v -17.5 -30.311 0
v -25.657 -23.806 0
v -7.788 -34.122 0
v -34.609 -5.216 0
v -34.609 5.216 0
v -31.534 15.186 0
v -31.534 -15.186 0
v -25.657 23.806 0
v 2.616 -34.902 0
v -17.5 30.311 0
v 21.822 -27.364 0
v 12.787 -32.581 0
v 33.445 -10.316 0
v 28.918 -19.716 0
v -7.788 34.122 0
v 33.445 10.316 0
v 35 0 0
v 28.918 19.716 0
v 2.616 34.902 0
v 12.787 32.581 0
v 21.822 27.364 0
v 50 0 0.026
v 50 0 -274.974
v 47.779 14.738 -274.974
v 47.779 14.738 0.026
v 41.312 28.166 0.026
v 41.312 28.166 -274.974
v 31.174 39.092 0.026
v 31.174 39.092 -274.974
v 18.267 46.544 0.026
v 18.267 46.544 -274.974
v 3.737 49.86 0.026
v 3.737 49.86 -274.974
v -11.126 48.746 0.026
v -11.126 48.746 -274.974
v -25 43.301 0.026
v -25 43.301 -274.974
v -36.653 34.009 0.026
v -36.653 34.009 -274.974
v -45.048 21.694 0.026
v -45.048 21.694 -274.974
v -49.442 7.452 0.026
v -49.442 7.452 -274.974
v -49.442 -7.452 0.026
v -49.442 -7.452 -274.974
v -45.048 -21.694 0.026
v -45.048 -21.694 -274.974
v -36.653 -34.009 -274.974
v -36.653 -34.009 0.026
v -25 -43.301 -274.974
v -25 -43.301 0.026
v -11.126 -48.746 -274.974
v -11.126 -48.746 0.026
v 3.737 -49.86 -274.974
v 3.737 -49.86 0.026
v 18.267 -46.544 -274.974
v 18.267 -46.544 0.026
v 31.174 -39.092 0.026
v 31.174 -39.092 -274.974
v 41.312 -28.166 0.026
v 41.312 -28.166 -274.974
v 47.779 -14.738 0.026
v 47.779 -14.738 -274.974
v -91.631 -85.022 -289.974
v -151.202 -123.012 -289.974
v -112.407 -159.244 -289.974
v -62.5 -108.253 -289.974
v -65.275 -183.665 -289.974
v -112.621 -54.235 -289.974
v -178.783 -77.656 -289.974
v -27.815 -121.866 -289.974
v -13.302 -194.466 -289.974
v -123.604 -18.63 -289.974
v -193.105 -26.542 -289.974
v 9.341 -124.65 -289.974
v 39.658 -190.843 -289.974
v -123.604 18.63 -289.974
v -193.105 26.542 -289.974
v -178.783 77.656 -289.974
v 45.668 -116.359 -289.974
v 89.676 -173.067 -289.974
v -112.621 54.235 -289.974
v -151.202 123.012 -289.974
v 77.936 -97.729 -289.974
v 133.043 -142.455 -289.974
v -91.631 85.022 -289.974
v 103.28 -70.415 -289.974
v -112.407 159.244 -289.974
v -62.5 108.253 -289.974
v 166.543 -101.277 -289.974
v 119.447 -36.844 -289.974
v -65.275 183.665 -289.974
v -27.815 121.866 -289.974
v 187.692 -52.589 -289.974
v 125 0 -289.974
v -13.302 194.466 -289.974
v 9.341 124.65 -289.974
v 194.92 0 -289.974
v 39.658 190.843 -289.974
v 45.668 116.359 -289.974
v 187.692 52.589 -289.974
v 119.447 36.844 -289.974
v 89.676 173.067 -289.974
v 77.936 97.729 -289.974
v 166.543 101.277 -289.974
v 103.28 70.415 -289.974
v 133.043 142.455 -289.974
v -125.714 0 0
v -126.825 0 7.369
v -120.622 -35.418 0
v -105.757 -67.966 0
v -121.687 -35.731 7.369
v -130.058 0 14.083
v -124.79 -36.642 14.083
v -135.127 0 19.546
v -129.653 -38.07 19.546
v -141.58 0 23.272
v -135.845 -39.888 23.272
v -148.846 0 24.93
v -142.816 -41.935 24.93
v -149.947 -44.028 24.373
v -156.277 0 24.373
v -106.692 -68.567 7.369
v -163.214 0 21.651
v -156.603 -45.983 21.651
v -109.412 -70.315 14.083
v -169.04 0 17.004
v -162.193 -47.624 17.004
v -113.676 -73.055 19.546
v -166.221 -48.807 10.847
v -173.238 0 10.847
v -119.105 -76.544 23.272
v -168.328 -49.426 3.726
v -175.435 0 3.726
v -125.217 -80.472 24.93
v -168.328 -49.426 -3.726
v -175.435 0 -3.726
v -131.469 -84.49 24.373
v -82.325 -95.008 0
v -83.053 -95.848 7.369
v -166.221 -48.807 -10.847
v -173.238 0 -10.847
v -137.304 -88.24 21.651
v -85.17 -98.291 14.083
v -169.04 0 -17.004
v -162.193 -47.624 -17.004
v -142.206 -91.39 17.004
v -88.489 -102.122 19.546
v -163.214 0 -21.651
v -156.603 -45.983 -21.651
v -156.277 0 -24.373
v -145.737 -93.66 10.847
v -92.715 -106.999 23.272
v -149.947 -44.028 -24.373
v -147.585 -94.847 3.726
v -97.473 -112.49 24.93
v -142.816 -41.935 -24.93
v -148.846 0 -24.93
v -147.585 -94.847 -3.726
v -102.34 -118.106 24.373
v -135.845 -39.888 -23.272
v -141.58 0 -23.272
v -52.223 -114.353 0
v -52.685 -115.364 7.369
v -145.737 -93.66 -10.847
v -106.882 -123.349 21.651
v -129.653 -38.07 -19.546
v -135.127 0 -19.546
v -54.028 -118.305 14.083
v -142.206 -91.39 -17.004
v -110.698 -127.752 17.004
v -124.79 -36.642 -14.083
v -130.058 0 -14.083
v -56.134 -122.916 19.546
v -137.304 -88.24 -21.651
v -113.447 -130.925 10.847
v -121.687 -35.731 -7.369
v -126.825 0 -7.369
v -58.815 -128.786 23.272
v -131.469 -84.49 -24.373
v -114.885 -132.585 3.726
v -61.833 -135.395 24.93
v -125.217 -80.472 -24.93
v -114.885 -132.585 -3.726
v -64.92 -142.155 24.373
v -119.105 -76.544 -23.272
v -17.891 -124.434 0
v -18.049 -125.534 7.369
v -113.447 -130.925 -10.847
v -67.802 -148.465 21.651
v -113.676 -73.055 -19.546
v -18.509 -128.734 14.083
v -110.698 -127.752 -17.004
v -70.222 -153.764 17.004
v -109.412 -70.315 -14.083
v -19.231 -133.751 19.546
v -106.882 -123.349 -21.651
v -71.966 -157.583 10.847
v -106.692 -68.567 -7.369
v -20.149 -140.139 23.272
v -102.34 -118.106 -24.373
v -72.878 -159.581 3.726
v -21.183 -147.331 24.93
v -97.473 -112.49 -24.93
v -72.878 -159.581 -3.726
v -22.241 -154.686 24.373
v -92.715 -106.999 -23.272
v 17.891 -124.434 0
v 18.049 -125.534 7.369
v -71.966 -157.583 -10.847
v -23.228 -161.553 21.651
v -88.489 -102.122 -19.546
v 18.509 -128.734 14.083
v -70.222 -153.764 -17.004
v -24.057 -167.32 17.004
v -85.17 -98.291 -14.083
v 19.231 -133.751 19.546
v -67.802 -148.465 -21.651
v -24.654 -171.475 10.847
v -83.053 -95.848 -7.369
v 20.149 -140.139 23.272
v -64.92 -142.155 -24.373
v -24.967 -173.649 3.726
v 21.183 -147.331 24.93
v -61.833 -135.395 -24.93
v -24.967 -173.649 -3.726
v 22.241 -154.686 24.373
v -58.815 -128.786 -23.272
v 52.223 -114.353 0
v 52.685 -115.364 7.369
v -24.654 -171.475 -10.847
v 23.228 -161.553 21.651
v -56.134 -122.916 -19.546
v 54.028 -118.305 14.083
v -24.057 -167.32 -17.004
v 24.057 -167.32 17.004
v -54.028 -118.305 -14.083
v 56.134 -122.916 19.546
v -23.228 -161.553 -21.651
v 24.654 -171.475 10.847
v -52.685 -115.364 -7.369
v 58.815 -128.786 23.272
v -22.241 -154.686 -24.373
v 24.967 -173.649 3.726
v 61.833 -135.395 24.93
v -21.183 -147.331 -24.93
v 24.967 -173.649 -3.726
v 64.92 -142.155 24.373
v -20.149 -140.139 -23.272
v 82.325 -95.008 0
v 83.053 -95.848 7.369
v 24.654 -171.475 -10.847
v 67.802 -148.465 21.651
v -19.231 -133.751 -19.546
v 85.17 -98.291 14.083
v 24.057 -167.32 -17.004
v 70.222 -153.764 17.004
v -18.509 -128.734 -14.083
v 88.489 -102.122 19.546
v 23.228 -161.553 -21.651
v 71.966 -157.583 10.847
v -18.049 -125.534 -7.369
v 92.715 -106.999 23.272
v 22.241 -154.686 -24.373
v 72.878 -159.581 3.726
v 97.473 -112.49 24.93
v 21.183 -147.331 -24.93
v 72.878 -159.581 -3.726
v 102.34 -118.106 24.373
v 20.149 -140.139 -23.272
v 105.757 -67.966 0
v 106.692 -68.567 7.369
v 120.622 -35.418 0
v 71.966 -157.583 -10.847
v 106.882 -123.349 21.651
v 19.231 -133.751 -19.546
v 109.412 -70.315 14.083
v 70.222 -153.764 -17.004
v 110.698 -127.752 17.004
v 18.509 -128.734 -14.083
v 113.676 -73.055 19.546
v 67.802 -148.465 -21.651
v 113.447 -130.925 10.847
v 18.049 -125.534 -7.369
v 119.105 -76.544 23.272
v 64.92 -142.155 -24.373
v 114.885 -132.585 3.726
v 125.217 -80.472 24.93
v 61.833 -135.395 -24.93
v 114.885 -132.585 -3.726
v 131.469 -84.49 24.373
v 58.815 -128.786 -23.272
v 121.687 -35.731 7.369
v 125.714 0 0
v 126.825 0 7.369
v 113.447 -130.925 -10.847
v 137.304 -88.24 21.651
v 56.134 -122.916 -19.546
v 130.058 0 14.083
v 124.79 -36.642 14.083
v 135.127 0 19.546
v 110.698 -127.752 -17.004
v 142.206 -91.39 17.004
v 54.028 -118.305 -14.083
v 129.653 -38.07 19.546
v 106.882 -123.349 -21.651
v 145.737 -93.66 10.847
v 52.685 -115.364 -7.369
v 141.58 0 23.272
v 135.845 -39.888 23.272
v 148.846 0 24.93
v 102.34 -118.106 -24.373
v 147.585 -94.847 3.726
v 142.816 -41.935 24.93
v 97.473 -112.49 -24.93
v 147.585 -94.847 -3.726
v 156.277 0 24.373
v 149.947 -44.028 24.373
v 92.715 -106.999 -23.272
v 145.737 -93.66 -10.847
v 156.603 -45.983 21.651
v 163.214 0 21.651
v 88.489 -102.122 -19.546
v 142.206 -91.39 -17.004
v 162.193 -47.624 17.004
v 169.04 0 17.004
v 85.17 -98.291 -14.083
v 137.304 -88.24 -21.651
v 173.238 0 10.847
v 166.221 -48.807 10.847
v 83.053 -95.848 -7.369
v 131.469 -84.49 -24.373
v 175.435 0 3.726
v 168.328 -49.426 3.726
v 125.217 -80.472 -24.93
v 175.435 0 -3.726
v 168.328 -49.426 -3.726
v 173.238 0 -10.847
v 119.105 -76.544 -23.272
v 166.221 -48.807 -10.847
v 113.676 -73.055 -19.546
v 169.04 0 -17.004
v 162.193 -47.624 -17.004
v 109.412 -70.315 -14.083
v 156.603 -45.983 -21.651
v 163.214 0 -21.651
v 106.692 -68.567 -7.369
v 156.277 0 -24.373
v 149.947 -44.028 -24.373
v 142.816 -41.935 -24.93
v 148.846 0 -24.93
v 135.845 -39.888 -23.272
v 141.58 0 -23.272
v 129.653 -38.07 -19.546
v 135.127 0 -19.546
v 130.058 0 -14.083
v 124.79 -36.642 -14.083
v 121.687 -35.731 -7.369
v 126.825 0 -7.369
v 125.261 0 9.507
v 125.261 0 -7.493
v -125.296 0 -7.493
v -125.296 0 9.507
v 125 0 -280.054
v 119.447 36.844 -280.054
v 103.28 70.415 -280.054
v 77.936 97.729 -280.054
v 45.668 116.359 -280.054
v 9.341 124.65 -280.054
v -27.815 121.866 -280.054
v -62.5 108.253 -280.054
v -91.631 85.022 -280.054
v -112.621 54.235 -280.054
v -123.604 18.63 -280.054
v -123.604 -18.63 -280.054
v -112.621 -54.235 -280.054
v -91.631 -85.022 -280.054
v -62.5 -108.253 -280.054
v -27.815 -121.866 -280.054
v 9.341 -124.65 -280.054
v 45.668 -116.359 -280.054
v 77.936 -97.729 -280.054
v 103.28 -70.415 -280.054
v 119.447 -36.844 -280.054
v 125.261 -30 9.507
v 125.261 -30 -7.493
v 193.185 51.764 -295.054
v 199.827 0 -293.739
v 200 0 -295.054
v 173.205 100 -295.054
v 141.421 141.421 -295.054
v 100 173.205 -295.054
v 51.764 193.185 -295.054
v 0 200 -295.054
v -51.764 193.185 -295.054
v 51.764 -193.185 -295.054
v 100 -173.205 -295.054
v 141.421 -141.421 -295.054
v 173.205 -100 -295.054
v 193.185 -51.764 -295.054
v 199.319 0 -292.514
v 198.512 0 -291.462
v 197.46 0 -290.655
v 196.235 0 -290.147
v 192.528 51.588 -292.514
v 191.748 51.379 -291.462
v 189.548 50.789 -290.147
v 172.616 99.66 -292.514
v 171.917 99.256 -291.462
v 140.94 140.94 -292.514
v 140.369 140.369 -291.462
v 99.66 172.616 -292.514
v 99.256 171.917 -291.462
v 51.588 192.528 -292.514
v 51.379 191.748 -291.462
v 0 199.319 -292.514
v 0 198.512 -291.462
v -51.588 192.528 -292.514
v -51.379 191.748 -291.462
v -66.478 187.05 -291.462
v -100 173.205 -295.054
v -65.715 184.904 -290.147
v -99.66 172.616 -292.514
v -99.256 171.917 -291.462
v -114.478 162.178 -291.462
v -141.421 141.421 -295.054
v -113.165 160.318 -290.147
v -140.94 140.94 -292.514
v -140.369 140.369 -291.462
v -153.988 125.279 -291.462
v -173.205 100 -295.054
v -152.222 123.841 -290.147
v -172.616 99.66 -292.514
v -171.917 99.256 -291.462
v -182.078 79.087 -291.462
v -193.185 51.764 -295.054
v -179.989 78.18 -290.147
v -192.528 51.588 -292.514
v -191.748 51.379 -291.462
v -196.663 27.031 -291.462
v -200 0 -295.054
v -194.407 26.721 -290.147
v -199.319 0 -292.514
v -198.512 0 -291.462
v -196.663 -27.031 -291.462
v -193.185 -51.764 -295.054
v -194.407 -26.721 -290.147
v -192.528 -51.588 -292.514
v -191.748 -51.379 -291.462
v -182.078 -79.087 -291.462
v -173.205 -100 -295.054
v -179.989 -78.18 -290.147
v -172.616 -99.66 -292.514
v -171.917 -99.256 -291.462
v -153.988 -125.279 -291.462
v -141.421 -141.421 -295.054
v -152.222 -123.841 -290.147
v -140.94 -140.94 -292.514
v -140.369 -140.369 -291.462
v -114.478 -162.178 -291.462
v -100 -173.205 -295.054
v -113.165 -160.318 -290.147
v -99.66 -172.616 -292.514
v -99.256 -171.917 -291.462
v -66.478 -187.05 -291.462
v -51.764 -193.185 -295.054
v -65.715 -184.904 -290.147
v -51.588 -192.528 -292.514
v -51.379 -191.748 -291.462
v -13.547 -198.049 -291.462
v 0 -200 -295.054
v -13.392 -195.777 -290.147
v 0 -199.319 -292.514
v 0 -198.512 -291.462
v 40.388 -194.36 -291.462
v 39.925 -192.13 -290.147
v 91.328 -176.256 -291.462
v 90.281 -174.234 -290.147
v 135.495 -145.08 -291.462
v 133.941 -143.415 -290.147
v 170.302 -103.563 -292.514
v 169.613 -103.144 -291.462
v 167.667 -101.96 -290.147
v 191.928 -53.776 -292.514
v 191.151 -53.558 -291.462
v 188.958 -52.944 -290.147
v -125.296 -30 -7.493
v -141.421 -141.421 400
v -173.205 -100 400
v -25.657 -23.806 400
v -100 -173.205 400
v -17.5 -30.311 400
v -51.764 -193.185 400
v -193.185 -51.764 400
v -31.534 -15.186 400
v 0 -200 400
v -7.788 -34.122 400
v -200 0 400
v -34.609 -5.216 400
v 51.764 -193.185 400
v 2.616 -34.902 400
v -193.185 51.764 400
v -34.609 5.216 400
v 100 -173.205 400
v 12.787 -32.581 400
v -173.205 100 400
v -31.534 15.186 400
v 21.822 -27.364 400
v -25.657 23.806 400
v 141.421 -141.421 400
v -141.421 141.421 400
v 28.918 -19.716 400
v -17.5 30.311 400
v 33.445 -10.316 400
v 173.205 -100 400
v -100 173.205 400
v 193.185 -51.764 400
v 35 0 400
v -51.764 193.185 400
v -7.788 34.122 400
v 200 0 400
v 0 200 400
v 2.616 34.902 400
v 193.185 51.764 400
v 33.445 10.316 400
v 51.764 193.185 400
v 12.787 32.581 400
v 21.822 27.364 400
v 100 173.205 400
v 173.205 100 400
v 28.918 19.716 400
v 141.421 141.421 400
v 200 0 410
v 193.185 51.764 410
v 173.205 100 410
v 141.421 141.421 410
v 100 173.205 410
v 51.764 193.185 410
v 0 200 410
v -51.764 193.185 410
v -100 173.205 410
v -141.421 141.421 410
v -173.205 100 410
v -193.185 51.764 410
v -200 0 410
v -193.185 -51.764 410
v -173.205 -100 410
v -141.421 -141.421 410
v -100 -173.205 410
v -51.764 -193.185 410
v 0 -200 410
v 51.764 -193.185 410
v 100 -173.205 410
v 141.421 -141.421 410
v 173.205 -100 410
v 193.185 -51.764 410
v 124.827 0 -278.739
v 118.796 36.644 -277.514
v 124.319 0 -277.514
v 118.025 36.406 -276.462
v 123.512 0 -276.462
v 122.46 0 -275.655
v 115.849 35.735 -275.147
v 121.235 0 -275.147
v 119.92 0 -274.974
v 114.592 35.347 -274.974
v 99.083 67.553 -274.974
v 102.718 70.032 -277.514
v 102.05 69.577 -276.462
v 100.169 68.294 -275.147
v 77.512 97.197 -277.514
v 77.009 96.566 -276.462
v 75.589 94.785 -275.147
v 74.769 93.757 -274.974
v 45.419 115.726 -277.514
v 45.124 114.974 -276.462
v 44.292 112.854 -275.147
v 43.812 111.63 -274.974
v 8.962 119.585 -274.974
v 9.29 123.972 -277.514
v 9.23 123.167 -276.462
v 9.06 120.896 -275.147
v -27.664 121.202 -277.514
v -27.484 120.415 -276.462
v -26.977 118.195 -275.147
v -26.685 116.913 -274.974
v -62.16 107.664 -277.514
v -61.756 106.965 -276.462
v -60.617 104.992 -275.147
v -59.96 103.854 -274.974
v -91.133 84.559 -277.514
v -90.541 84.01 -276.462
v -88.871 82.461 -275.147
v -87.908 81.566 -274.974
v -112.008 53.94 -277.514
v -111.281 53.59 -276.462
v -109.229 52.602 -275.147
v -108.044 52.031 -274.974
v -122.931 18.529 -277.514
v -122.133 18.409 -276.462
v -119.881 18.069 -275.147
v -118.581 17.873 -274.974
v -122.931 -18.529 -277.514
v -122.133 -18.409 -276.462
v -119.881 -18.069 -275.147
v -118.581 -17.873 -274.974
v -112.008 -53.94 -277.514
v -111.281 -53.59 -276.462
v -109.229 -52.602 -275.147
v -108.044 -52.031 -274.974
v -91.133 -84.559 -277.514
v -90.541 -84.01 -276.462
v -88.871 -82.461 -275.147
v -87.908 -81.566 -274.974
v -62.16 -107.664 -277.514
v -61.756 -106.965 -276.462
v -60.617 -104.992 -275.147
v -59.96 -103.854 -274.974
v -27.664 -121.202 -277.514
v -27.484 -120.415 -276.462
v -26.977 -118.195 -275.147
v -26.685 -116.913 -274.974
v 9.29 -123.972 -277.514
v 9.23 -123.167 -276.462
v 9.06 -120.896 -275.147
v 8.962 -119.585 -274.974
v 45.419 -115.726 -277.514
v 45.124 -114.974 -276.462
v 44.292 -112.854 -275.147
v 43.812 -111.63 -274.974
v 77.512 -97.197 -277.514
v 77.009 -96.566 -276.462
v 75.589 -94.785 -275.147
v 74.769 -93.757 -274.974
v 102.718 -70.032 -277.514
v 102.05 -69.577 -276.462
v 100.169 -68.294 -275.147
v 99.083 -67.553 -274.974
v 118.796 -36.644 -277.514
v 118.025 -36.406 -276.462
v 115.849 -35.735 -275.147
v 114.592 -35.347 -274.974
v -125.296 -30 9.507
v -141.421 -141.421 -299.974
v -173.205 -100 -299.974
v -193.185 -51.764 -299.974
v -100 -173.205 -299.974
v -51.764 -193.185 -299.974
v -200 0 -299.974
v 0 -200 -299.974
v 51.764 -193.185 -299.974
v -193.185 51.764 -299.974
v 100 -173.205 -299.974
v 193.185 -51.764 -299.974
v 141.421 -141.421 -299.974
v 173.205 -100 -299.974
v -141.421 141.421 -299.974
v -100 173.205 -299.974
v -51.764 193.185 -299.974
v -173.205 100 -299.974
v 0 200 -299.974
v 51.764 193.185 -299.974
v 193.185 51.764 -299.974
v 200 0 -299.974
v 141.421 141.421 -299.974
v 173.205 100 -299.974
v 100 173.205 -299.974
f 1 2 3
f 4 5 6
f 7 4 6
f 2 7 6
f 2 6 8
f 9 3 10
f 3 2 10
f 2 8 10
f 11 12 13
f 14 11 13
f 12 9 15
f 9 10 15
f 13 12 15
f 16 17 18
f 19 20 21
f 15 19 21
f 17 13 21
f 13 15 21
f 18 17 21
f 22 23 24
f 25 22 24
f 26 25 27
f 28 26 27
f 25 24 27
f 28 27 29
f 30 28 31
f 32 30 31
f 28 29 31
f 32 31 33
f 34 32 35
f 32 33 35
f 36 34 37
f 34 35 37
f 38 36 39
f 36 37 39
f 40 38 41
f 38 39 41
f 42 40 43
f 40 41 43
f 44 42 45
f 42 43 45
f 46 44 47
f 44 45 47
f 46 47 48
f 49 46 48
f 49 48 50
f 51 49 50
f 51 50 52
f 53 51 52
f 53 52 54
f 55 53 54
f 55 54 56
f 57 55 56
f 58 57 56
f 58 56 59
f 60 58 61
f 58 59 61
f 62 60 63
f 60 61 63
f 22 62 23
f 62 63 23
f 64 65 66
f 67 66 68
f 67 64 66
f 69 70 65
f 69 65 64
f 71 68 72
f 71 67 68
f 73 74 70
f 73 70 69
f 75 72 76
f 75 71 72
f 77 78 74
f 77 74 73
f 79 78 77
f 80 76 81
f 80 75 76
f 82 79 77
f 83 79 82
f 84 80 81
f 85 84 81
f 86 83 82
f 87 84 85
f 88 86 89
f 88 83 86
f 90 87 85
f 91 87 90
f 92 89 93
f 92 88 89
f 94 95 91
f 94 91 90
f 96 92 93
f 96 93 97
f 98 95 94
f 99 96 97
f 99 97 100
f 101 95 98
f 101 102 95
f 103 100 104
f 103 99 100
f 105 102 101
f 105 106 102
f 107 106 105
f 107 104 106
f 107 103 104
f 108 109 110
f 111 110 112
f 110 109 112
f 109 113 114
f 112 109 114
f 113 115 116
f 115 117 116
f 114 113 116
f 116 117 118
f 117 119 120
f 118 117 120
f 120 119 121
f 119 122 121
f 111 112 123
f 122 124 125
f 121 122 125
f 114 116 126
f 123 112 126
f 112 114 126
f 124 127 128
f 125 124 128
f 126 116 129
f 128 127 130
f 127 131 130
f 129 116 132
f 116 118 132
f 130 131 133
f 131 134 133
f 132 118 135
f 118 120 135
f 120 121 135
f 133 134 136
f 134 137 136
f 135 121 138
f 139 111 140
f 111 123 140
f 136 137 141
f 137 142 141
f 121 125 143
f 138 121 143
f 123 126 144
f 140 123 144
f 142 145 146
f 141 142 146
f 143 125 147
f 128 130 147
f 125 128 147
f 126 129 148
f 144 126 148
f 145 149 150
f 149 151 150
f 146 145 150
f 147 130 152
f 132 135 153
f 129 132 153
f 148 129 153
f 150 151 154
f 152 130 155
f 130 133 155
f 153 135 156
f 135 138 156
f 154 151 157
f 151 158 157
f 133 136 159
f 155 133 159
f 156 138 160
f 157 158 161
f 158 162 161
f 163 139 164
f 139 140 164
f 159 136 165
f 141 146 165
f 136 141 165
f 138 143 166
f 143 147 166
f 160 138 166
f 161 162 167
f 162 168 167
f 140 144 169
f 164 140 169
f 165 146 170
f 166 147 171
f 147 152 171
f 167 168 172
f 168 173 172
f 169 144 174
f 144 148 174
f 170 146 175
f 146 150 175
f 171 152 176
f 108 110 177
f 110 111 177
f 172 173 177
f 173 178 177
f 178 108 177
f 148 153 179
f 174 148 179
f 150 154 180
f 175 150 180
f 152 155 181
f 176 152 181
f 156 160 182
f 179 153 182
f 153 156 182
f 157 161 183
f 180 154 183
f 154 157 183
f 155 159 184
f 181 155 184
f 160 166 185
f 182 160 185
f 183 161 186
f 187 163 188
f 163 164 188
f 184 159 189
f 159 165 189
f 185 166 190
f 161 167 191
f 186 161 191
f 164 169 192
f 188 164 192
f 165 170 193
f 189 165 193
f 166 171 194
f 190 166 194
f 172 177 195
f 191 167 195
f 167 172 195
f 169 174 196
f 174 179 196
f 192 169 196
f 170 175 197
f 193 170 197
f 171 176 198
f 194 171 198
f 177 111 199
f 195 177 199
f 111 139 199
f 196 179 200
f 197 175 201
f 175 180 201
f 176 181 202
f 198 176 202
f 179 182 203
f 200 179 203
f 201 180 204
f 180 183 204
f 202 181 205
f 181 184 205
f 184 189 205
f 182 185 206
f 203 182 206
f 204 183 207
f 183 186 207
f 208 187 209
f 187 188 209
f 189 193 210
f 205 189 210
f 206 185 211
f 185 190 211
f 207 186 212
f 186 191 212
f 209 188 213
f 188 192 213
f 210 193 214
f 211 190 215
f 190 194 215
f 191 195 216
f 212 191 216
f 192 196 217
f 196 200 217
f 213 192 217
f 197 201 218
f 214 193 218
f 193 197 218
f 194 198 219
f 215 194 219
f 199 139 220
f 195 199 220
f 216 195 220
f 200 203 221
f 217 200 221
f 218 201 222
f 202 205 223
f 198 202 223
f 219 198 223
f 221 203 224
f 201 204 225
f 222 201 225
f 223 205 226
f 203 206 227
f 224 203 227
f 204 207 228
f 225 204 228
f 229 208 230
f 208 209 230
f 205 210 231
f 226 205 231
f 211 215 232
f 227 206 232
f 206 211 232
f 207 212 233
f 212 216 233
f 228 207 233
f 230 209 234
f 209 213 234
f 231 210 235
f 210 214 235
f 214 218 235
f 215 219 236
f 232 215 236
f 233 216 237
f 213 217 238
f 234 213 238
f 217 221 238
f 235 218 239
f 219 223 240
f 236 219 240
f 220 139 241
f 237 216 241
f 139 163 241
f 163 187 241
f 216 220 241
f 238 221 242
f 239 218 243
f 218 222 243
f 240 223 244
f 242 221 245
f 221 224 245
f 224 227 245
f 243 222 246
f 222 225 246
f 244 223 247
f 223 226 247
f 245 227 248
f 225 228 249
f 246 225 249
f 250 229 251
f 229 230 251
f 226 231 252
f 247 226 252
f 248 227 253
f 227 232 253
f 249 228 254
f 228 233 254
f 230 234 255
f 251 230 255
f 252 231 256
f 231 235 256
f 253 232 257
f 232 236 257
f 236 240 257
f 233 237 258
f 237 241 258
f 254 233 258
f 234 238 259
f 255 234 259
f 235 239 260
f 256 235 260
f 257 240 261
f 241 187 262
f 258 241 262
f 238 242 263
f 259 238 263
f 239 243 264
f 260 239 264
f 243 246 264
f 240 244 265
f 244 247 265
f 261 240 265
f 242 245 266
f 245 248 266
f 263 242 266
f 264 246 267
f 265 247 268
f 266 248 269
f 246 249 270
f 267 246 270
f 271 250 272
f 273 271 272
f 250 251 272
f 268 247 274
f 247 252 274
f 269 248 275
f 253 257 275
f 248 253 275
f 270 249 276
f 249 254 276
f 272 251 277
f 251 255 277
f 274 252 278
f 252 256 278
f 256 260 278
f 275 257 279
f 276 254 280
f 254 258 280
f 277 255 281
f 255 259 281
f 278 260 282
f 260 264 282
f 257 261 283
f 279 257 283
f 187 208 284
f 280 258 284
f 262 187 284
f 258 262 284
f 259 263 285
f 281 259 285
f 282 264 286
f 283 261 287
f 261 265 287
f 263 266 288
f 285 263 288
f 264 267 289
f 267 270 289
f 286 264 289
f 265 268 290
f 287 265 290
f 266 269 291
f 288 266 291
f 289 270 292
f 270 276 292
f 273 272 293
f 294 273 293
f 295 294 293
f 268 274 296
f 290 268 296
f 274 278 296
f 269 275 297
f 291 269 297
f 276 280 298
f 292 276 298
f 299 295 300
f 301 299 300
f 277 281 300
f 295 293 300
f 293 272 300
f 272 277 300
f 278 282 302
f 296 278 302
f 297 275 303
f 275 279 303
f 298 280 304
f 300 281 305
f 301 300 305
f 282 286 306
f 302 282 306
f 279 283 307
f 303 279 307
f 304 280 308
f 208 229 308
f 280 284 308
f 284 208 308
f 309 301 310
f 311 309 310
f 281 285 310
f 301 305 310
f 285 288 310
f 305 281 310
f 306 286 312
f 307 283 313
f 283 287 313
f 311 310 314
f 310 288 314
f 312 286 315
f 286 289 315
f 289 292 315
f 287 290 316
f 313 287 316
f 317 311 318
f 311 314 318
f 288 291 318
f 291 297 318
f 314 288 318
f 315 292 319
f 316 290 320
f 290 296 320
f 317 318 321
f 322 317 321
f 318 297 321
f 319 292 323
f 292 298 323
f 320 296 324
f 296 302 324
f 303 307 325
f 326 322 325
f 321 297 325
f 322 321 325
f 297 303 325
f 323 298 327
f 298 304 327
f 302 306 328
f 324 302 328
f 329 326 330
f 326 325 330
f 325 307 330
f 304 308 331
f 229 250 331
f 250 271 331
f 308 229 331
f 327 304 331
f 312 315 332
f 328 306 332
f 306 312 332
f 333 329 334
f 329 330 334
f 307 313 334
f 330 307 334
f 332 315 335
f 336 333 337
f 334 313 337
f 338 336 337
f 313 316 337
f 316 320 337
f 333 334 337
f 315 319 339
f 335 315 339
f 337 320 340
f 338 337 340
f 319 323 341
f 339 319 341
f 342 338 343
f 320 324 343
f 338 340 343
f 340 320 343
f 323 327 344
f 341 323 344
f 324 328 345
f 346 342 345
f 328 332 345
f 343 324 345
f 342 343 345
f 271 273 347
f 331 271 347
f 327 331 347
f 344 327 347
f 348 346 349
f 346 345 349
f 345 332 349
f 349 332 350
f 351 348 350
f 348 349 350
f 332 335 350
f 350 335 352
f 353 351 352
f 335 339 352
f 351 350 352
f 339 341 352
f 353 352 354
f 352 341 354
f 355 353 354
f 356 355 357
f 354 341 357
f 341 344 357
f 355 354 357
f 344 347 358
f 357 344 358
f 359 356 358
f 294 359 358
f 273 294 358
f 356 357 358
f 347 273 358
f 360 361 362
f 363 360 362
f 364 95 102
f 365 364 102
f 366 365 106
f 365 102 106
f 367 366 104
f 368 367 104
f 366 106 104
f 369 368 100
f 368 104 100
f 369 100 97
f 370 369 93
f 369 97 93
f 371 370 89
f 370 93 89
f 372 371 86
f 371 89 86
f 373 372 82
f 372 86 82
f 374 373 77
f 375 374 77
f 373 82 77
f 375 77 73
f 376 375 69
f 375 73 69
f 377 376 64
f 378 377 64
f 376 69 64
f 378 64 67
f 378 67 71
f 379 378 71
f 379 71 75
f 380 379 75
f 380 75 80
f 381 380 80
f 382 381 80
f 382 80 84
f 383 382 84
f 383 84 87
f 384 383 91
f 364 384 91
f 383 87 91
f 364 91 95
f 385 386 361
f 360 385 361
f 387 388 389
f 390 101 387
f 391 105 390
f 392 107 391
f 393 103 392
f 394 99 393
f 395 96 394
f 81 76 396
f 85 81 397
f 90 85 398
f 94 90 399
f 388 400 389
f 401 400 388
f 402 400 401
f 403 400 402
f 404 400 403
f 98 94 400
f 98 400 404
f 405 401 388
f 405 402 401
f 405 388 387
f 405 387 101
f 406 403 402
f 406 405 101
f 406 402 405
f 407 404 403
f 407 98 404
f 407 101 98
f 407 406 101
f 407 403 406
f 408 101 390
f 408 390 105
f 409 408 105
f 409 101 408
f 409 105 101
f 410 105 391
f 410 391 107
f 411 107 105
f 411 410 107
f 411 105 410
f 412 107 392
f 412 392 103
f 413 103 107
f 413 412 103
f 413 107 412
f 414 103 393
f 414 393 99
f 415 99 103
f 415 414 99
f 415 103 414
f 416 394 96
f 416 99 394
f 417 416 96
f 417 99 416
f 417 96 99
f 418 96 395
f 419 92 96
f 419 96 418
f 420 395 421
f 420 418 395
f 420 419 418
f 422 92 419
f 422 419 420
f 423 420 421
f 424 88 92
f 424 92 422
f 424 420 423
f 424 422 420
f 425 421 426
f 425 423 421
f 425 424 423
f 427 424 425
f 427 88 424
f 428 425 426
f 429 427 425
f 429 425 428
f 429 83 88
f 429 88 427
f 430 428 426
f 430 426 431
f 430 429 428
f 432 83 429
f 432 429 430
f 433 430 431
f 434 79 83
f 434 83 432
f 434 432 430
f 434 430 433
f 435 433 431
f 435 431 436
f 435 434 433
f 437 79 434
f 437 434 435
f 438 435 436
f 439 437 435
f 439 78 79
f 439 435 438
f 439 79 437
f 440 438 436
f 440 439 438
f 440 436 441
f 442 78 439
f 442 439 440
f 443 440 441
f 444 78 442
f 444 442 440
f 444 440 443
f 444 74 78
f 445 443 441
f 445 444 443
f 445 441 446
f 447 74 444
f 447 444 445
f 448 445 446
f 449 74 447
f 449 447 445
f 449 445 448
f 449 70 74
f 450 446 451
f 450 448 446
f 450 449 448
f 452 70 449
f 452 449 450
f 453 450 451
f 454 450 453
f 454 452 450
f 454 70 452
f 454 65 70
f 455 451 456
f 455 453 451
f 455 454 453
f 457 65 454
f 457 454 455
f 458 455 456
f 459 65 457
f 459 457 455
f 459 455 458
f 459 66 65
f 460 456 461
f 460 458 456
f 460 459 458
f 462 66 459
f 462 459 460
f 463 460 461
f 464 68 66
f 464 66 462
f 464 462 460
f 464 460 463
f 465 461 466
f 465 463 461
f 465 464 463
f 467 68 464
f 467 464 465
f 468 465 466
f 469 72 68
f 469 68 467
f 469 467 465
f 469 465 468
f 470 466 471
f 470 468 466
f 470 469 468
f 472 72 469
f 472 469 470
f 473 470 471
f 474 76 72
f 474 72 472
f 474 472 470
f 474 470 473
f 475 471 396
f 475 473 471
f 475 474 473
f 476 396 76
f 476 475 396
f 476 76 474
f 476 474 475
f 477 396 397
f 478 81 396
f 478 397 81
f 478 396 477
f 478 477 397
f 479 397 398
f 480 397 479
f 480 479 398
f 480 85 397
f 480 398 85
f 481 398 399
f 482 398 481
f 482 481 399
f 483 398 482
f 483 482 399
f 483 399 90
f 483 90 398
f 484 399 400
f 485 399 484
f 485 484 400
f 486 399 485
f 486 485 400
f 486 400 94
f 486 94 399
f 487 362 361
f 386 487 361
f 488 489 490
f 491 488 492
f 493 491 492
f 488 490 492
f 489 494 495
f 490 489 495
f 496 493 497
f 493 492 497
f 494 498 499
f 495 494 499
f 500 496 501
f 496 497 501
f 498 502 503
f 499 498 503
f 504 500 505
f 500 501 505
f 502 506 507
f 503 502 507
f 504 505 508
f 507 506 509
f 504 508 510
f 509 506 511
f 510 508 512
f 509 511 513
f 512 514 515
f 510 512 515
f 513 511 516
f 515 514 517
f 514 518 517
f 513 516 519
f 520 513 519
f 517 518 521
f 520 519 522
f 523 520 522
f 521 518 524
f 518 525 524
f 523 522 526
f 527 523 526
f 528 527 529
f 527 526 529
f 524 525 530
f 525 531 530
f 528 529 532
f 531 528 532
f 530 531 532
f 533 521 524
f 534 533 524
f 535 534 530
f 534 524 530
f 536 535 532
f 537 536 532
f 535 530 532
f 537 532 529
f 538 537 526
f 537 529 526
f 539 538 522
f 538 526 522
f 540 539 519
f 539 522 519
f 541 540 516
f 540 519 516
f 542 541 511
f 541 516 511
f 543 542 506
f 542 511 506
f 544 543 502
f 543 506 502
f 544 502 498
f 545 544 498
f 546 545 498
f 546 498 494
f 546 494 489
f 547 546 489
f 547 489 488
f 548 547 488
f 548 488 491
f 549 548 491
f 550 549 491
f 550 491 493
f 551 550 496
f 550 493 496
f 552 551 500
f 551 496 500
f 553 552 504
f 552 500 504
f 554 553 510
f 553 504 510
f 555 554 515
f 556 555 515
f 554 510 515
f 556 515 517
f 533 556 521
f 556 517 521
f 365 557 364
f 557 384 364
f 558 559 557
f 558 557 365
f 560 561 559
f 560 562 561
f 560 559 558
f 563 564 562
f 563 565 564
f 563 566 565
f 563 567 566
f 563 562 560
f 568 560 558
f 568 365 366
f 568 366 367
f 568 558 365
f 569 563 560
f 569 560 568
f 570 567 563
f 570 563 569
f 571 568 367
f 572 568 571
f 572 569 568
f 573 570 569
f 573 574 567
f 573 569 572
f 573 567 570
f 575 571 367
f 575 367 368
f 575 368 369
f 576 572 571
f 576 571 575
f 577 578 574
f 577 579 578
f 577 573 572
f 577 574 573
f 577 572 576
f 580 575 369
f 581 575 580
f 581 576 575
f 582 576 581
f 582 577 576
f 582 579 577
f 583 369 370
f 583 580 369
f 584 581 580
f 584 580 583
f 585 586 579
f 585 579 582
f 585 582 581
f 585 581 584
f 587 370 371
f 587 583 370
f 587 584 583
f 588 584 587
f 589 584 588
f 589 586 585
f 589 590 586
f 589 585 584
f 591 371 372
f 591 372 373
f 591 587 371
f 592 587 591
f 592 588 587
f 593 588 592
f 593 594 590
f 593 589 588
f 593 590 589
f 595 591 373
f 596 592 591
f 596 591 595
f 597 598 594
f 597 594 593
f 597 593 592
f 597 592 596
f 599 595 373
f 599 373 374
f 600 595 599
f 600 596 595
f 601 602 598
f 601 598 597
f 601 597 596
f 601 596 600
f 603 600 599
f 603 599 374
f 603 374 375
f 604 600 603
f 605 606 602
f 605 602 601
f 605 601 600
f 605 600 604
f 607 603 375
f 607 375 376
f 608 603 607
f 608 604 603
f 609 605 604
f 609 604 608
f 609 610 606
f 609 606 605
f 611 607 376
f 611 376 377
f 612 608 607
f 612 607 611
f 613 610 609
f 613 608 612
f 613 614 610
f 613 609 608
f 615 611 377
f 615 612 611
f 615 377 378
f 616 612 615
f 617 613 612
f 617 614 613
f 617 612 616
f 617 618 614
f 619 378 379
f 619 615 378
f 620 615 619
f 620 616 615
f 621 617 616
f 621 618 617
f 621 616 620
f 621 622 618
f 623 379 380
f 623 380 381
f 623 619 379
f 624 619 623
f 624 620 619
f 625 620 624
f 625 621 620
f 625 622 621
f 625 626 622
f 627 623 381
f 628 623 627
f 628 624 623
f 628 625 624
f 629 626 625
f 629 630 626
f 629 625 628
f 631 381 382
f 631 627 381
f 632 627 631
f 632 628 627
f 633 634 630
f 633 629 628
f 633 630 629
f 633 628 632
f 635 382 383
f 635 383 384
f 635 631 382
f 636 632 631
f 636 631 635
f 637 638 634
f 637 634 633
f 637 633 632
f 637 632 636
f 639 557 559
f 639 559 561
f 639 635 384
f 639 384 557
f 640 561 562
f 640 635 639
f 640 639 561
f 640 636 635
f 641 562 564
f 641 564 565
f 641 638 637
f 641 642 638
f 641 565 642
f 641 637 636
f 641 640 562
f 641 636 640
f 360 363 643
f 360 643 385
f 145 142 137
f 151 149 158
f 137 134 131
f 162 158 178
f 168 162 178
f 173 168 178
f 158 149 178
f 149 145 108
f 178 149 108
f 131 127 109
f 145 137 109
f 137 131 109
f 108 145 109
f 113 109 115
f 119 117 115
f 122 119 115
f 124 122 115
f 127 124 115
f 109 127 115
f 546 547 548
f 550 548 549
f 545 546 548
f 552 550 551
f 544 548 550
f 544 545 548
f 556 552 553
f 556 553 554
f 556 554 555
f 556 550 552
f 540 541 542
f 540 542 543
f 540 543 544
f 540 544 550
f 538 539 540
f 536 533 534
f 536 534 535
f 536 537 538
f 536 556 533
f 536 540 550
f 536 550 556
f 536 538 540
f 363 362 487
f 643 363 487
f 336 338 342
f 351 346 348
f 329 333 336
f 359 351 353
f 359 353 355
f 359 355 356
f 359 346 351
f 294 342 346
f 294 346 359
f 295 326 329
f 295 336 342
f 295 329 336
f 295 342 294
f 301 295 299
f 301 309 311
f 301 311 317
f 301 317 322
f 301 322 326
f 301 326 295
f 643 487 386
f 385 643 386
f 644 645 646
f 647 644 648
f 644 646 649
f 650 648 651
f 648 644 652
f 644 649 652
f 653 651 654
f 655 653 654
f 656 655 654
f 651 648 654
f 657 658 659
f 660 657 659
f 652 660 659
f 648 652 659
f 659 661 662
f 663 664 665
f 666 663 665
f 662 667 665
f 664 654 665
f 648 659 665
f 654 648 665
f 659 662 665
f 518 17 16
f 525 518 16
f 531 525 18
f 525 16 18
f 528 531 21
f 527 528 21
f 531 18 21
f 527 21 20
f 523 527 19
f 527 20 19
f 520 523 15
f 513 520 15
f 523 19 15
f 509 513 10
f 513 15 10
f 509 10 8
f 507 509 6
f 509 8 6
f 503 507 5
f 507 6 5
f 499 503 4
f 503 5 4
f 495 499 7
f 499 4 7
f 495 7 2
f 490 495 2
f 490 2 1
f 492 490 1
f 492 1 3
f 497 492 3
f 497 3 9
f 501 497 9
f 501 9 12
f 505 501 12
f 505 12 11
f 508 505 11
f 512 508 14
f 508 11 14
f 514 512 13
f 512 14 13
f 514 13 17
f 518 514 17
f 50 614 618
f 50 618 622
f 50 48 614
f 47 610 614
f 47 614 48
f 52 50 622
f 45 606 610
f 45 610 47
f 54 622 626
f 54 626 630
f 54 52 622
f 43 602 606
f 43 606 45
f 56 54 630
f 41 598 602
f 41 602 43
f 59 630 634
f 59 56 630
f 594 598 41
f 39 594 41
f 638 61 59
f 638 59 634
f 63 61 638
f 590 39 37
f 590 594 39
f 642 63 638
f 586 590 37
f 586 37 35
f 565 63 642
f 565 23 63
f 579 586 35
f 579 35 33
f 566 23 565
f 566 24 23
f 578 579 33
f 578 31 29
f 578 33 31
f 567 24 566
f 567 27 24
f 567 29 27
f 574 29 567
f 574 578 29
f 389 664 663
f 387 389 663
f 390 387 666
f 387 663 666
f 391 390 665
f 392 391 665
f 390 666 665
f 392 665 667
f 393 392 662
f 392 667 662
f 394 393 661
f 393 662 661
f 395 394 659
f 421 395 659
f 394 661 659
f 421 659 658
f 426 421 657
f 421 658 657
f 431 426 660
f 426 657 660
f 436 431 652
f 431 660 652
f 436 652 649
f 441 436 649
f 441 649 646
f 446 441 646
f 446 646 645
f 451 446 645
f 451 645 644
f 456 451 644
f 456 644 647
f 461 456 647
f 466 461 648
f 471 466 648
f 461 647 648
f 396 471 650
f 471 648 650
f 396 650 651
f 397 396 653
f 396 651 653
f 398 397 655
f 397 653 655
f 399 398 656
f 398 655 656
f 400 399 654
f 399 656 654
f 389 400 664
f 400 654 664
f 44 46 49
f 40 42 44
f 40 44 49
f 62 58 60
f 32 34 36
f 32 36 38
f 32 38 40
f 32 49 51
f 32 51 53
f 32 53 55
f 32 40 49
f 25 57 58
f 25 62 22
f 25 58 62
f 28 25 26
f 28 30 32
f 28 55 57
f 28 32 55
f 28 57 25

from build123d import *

# Parameters (mm, degrees)
F1_R      = 200
F2_DEPTH  = 10
F3_R      = 125
F4_DEPTH  = 15
F5_R      = 5.08
F6_R      = 50
F7_DEPTH  = 275
F9_R      = 25
F10_ANGLE = 180
F11_DEPTH = 17
F13_R     = 35
F14_DEPTH = 400
F15_R     = 200
F16_DEPTH = 10


with BuildPart() as f2:
    # F1 (on offset) → F2 (new body)
    with BuildSketch(Plane.XY.offset(-299.974)):
        Circle(F1_R)
    extrude(amount=F2_DEPTH)

    # F3 (on face) → F4 (join)
    with BuildSketch(Plane.XY.offset(-289.974)):
        Circle(F3_R)
    extrude(amount=F4_DEPTH)

    # F5
    f5_edges = [f2.edges().sort_by_distance(p)[0] for p in [
        (-200, 0, -289.974),
        (-125, 0, -274.974),
    ]]
    fillet(f5_edges, radius=F5_R)

    # F6 (on face) → F7 (join)
    with BuildSketch(Plane.XY.offset(-274.974)):
        Circle(F6_R)
    extrude(amount=F7_DEPTH)


with BuildPart() as f10:
    # F9 (on Front) → F10 (revolve)
    with BuildSketch(Plane.XZ):
        with Locations((-150.7140100002, 0)):
            Circle(F9_R)
    revolve(axis=Axis((0, 0, -274.974), (0, 0, 1)), revolution_arc=F10_ANGLE)


with BuildPart() as f11:
    # F8 (on Top) → F11 (new body)
    with BuildSketch(Plane.XY):
        Polygon((49.9921217561, 0), (-49.7969053686, 0), (-125.2955198288, 0), (-125.2955198288, -30), (125.2613514662, -30), (125.2613514662, 0), align=None)
    extrude(amount=F11_DEPTH)


with BuildPart() as f11_1:
    # F12: moved
    add(f11.part.moved(Location((0, 0, -7.493))))


with BuildPart() as f14:
    # F13 (on Top) → F14 (new body)
    with BuildSketch(Plane.XY):
        Circle(F13_R)
    extrude(amount=F14_DEPTH)

    # F15 (on face) → F16 (join)
    with BuildSketch(Plane.XY.offset(400)):
        Circle(F15_R)
    extrude(amount=F16_DEPTH)


solid = Compound([f2.part, f10.part, f11_1.part, f14.part])
